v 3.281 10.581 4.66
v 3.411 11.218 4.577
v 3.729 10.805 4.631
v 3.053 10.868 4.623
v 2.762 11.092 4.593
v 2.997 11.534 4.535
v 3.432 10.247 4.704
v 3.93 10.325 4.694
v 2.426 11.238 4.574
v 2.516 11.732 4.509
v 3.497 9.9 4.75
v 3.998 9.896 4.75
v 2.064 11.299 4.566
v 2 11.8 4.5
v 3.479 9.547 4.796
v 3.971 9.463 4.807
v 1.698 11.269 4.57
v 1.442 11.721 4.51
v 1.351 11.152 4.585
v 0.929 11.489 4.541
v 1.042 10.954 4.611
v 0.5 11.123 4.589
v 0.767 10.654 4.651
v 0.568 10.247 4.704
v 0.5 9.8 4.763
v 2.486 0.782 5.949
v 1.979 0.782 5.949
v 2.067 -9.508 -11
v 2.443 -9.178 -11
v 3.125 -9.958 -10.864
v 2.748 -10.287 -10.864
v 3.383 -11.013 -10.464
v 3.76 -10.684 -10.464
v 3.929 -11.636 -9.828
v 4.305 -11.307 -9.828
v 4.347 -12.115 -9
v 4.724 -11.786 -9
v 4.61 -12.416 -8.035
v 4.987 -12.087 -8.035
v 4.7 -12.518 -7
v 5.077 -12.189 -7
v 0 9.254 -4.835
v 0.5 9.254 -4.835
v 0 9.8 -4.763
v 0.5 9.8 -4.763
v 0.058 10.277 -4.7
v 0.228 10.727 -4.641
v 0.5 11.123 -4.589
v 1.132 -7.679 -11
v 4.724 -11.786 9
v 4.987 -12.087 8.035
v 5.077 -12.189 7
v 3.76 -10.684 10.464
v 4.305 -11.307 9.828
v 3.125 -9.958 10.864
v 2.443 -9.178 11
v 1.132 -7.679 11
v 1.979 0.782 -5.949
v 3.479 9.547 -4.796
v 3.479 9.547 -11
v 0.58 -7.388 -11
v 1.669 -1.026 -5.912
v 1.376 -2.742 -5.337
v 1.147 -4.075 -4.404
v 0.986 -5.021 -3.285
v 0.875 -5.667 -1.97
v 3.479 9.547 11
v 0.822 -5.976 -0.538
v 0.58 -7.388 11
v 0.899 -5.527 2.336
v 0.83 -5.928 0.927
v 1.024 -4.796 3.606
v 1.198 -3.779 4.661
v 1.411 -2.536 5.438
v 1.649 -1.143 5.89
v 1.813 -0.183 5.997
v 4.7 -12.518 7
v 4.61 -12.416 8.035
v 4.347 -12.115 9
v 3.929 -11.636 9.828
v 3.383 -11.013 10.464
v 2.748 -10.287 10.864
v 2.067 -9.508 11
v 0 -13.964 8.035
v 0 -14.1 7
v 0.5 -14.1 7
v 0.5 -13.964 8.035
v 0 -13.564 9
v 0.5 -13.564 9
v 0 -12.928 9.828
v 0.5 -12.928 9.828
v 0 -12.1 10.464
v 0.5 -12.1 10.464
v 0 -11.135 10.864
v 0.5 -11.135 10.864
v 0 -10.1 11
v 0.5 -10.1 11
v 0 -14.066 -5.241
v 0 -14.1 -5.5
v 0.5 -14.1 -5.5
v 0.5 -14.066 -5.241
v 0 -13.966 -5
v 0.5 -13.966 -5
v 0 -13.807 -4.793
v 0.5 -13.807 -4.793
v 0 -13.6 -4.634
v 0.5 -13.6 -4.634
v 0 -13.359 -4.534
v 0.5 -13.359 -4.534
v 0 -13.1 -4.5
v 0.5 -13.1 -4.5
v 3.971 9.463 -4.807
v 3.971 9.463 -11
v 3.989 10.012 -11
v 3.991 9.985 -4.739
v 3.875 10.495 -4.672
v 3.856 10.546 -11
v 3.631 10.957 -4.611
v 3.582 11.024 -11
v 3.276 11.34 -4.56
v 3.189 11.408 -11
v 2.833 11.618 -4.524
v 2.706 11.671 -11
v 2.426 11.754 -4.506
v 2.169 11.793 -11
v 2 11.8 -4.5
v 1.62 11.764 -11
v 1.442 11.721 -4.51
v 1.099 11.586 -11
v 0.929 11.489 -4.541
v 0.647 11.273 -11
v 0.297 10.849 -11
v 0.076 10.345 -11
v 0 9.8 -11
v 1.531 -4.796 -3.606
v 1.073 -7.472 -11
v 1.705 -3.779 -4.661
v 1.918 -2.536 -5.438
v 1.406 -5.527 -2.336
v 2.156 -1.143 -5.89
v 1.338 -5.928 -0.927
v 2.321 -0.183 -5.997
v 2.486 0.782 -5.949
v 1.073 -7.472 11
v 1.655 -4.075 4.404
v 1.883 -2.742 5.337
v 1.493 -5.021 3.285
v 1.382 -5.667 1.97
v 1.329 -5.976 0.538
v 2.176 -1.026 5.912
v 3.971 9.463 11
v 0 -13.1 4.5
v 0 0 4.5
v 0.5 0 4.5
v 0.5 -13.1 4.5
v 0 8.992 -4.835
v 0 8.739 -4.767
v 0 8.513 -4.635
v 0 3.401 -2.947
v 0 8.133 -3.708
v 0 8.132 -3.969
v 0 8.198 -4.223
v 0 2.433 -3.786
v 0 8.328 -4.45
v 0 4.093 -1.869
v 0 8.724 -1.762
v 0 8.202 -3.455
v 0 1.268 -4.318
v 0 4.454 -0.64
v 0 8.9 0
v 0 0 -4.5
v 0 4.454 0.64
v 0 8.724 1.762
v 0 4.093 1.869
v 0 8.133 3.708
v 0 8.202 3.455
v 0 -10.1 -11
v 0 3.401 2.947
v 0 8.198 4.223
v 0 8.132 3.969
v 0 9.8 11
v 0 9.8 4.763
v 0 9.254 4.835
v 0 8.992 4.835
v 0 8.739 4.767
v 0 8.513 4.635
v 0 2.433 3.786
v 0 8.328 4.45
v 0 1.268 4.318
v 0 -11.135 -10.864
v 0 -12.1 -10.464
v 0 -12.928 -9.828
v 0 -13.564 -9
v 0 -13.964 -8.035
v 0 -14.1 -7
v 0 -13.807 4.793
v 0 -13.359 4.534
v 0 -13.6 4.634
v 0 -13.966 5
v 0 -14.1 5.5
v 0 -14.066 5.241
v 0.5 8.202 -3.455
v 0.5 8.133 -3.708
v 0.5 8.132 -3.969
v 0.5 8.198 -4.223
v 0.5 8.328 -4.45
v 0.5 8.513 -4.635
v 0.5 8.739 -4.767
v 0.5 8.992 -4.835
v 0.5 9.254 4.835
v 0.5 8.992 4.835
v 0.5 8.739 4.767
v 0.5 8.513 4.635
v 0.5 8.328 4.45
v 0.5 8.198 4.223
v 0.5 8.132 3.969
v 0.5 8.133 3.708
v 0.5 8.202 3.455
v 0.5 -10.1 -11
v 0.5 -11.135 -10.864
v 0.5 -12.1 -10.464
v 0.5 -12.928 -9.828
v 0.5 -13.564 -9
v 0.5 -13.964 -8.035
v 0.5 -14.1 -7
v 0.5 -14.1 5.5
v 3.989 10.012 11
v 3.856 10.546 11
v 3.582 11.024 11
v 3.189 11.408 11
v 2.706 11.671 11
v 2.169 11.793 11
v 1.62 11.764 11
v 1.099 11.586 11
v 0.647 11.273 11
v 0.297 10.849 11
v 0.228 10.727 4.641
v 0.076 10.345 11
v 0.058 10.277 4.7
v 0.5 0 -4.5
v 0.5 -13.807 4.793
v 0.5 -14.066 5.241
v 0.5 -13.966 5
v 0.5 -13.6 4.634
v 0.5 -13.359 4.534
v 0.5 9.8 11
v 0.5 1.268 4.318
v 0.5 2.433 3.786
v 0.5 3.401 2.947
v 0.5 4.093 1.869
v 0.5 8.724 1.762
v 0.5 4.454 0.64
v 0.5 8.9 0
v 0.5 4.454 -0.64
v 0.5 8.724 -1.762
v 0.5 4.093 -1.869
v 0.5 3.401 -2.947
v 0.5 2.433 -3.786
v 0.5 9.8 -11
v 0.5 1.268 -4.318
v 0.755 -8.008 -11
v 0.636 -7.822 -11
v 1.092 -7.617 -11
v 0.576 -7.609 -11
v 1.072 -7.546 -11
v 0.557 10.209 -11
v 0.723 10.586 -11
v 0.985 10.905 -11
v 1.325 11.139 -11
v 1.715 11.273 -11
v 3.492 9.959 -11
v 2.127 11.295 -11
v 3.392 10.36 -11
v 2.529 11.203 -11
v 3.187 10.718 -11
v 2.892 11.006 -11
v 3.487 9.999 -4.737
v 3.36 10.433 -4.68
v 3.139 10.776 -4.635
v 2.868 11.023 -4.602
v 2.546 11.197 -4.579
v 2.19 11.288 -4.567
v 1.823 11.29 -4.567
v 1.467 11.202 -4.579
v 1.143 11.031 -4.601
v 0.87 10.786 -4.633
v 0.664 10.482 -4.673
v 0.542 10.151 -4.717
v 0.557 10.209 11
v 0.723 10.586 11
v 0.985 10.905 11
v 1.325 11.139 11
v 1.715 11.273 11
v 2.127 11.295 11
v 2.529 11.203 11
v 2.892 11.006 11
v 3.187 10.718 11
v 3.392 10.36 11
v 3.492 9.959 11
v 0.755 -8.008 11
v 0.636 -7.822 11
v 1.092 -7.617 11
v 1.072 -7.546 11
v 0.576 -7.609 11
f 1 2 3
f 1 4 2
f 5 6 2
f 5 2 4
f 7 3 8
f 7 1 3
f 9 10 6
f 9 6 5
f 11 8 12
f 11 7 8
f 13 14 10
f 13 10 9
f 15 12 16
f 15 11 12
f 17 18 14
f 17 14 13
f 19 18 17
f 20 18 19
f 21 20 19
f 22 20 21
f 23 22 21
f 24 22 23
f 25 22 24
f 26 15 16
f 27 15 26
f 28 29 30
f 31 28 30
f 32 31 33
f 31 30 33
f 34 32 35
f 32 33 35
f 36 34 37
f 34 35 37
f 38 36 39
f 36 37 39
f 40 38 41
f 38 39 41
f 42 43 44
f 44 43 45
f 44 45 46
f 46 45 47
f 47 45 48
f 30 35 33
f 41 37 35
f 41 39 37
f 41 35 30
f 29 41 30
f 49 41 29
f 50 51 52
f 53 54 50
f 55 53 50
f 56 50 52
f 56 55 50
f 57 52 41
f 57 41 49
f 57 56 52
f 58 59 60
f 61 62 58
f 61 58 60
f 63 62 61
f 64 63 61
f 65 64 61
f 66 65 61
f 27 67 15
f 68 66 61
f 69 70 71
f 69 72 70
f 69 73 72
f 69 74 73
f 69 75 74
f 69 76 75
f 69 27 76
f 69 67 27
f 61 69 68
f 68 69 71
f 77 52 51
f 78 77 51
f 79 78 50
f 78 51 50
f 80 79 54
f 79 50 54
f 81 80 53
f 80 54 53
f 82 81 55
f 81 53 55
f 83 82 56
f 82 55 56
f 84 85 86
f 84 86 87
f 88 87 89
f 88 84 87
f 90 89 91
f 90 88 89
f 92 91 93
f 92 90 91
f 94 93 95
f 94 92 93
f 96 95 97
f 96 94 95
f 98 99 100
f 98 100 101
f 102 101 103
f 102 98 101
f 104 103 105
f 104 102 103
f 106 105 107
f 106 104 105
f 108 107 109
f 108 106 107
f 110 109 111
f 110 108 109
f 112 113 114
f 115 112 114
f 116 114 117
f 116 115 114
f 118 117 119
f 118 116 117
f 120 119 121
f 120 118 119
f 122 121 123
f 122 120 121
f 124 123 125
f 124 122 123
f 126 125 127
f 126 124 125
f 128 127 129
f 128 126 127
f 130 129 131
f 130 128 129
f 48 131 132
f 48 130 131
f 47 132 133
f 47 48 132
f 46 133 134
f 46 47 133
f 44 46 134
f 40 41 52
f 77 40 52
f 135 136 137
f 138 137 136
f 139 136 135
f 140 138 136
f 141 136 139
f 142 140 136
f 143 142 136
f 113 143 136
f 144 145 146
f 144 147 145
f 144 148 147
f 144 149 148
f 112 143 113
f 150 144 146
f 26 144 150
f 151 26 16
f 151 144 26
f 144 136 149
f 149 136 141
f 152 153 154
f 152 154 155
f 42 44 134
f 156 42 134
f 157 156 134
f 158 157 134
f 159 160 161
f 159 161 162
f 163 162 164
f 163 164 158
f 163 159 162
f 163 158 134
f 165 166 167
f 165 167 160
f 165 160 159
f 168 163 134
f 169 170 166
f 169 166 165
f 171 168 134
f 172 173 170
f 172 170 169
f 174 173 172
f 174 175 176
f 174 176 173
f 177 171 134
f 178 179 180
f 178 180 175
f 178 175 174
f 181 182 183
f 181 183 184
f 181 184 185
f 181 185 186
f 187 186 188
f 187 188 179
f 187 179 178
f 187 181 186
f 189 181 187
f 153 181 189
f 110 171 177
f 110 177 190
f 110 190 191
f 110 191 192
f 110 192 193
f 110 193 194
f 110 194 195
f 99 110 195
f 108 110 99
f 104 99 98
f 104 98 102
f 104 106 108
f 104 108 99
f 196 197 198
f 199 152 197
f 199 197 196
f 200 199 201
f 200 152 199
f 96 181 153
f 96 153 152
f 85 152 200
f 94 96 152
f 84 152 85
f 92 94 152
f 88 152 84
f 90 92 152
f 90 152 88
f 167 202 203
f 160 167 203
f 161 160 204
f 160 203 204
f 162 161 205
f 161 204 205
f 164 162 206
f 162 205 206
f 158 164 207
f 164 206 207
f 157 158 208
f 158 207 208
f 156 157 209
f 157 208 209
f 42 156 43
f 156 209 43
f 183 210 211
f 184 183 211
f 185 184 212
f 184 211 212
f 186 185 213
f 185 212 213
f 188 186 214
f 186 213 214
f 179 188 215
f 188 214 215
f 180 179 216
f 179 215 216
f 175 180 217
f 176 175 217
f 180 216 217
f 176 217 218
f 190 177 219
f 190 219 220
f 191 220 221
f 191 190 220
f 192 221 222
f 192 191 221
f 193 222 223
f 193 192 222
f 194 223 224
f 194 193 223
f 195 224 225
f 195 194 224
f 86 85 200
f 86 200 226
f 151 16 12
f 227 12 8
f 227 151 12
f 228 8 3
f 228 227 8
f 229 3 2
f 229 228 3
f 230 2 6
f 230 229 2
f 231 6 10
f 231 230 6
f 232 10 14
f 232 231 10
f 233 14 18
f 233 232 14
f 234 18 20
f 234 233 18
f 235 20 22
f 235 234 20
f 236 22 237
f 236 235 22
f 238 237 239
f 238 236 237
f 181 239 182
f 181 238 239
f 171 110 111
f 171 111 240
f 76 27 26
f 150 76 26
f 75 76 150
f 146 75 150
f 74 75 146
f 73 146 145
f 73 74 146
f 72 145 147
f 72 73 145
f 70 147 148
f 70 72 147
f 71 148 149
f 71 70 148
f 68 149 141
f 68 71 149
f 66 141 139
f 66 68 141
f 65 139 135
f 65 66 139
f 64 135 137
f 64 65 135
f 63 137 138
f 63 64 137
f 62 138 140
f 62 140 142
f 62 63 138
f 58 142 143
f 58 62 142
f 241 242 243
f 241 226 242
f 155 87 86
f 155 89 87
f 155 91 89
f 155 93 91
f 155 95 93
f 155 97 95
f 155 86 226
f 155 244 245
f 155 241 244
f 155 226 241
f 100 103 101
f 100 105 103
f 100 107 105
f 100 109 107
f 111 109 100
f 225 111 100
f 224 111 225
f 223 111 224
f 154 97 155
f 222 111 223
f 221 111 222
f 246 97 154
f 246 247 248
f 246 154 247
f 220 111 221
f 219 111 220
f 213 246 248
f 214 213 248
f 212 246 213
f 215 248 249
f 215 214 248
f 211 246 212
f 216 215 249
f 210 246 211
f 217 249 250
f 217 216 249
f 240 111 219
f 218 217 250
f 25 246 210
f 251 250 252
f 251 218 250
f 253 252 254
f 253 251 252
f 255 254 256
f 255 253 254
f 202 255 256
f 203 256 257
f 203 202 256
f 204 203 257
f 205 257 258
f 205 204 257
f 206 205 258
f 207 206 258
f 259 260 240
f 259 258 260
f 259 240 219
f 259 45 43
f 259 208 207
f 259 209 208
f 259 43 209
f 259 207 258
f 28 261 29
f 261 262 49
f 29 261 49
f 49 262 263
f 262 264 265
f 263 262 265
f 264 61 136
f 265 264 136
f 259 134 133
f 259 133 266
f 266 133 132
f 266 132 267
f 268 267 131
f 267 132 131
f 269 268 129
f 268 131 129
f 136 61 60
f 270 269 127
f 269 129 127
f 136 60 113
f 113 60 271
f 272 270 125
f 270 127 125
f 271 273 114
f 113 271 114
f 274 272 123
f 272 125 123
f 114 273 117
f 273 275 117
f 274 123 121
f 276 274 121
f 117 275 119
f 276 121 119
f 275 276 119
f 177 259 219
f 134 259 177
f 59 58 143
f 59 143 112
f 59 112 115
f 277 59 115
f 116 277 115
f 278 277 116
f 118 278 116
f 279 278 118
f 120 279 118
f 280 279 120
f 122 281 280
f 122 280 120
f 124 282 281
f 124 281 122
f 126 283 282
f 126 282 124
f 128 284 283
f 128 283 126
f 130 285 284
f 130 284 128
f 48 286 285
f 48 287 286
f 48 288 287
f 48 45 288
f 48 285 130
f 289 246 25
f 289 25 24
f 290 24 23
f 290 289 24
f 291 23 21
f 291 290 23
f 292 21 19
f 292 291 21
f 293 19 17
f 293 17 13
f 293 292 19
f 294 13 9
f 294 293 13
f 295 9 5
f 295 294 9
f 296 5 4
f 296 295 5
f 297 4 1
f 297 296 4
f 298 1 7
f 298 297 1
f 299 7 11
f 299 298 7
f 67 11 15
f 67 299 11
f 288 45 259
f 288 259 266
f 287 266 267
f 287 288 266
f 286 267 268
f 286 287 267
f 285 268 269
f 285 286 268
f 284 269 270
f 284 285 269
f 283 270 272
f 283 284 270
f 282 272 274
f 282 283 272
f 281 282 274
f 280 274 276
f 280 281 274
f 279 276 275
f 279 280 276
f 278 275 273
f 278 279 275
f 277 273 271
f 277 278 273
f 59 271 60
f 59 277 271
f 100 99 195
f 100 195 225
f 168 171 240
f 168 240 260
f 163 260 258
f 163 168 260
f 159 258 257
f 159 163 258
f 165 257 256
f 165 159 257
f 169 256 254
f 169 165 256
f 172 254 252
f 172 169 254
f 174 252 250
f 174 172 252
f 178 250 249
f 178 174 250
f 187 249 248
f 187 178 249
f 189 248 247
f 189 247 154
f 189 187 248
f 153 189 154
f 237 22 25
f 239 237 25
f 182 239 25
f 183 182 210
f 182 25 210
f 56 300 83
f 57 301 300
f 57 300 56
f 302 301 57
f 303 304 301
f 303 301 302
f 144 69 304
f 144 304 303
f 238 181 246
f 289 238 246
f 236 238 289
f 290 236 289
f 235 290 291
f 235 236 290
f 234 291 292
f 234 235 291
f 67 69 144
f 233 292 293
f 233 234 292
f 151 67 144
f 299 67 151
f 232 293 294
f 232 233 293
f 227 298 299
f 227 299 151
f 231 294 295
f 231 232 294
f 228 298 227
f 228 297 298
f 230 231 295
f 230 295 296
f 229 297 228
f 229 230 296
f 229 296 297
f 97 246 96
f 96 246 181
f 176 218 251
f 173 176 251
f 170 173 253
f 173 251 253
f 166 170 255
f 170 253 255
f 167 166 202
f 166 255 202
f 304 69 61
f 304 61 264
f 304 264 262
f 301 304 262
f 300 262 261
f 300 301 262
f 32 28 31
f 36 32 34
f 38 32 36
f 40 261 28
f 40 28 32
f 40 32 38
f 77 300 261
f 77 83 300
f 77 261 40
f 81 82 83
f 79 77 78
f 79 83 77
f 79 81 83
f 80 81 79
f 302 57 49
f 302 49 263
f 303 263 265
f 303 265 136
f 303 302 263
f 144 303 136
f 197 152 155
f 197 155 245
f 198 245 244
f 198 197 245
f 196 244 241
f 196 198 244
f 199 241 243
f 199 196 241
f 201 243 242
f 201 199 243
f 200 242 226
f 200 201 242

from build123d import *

# Parameters (mm, degrees)
BOSS_EXTRUDE1_DEPTH      = 11
BOSS_EXTRUDE1_DEPTH_BACK = 11
CUT_EXTRUDE1_DEPTH       = 0.5
CUT_EXTRUDE2_DEPTH       = 5
CUT_EXTRUDE3_DEPTH       = 5
CUT_EXTRUDE4_DEPTH       = 0.5
CUT_EXTRUDE5_DEPTH       = 0.5
CUT_EXTRUDE6_DEPTH       = 0.5
CUT_EXTRUDE7_DEPTH       = 0.5
CUT_EXTRUDE8_DEPTH       = 1
CUT_EXTRUDE8_DEPTH_BACK  = 1


with BuildPart() as part:
    # Sketch1 → Boss-Extrude1 (new, two sides: drawn at the far end of the back side and taken through both)
    with BuildSketch(Plane.XY.offset(-BOSS_EXTRUDE1_DEPTH_BACK)):
        with BuildLine():
            Line((0, 9.8), (0, -14.1))
            Line((0, -14.1), (0.5, -14.1))
            Line((0.5, -14.1), (0.5, 9.8))
            ThreePointArc((0.5, 9.8), (2.126963265, 11.294617118), (3.478507106, 9.546984708))
            Line((3.478507106, 9.546984708), (0.580460074, -7.387893417))
            ThreePointArc((0.580460074, -7.387893417), (0.597810426, -7.717762239), (0.75519649, -8.008182798))
            Line((0.75519649, -8.008182798), (4.700431296, -12.518581837))
            Line((4.700431296, -12.518581837), (5.076776054, -12.189394014))
            Line((5.076776054, -12.189394014), (1.131541248, -7.678994975))
            ThreePointArc((1.131541248, -7.678994975), (1.079079227, -7.582188122), (1.073295776, -7.472231848))
            Line((1.073295776, -7.472231848), (3.971342808, 9.462646278))
            ThreePointArc((3.971342808, 9.462646278), (2.169284353, 11.792822824), (0, 9.8))
        make_face()
    extrude(amount=BOSS_EXTRUDE1_DEPTH + BOSS_EXTRUDE1_DEPTH_BACK)

    # Sketch2 → Cut-Extrude1 (cut)
    with BuildSketch(Plane(origin=(0, 0, 0), x_dir=(0, 0, -1), z_dir=(1, 0, 0))):
        with BuildLine():
            Line((-4.5, 0), (-4.5, -14.1))
            Line((-4.5, -14.1), (4.5, -14.1))
            Line((4.5, -14.1), (4.5, 0))
            ThreePointArc((4.5, 0), (0, 4.5), (-4.5, 0))
        make_face()
    extrude(amount=CUT_EXTRUDE1_DEPTH, mode=Mode.SUBTRACT)

    # Sketch3 → Cut-Extrude2 (cut)
    with BuildSketch(Plane(origin=(0.5, 0, 0), x_dir=(0, 0, -1), z_dir=(1, 0, 0))):
        with BuildLine():
            Line((5.948789681, 0.782241223), (4.5, 11.8))
            Line((4.5, 11.8), (-4.5, 11.8))
            Line((-4.5, 11.8), (-5.948789681, 0.782241223))
            ThreePointArc((-5.948789681, 0.782241223), (0, -6), (5.948789681, 0.782241223))
        make_face()
    extrude(amount=CUT_EXTRUDE2_DEPTH, mode=Mode.SUBTRACT)

    # Sketch4 → Cut-Extrude3 (cut)
    with BuildSketch(Plane(origin=(0.5, 0, 0), x_dir=(0, 0, -1), z_dir=(1, 0, 0))):
        with BuildLine():
            Line((4.834801398, 9.253901634), (4.5, 11.8))
            Line((4.5, 11.8), (-4.5, 11.8))
            Line((-4.5, 11.8), (-4.834801398, 9.253901634))
            ThreePointArc((-4.834801398, 9.253901634), (-4.449655576, 8.328306669), (-3.455120629, 8.20195961))
            ThreePointArc((-3.455120629, 8.20195961), (1.1e-08, 8.9), (3.455120648, 8.201959602))
            ThreePointArc((3.455120648, 8.201959602), (4.449655585, 8.328306676), (4.834801398, 9.253901634))
        make_face()
    extrude(amount=-CUT_EXTRUDE3_DEPTH, mode=Mode.SUBTRACT)

    # Sketch5 → Cut-Extrude4 (cut)
    with BuildSketch(Plane(origin=(0, 0, 0), x_dir=(0, 0, -1), z_dir=(1, 0, 0))):
        with BuildLine():
            Line((-11, -14.1), (-7, -14.1))
            ThreePointArc((-7, -14.1), (-9.828427125, -12.928427125), (-11, -10.1))
            Line((-11, -10.1), (-11, -14.1))
        make_face()
    extrude(amount=CUT_EXTRUDE4_DEPTH, mode=Mode.SUBTRACT)

    # Sketch6 → Cut-Extrude5 (cut)
    with BuildSketch(Plane(origin=(0, 0, 0), x_dir=(0, 0, -1), z_dir=(1, 0, 0))):
        with BuildLine():
            Line((7, -14.1), (11, -14.1))
            Line((11, -14.1), (11, -10.1))
            ThreePointArc((11, -10.1), (9.828427125, -12.928427125), (7, -14.1))
        make_face()
    extrude(amount=CUT_EXTRUDE5_DEPTH, mode=Mode.SUBTRACT)

    # Sketch7 → Cut-Extrude6 (cut)
    with BuildSketch(Plane(origin=(0, 0, 0), x_dir=(0, 0, -1), z_dir=(1, 0, 0))):
        with BuildLine():
            Line((4.5, -14.1), (5.5, -14.1))
            ThreePointArc((5.5, -14.1), (4.792893219, -13.807106781), (4.5, -13.1))
            Line((4.5, -13.1), (4.5, -14.1))
        make_face()
    extrude(amount=CUT_EXTRUDE6_DEPTH, mode=Mode.SUBTRACT)

    # Sketch8 → Cut-Extrude7 (cut)
    with BuildSketch(Plane(origin=(0, 0, 0), x_dir=(0, 0, -1), z_dir=(1, 0, 0))):
        with BuildLine():
            Line((-5.5, -14.1), (-4.5, -14.1))
            Line((-4.5, -14.1), (-4.5, -13.1))
            ThreePointArc((-4.5, -13.1), (-4.792893219, -13.807106781), (-5.5, -14.1))
        make_face()
    extrude(amount=CUT_EXTRUDE7_DEPTH, mode=Mode.SUBTRACT)

    # Sketch9 → Cut-Extrude8 (cut, two sides: drawn at the far end of the back side and taken through both)
    with BuildSketch(Plane(origin=(-3.164279663, -2.76778754, 0), x_dir=(0, 0, -1), z_dir=(0.7526895169963331, 0.6583756458161457, 0)).offset(-CUT_EXTRUDE8_DEPTH_BACK)):
        with BuildLine():
            Line((-11, -8.516878218), (-15, -8.516878218))
            Line((-15, -8.516878218), (-15, -16.516878218))
            Line((-15, -16.516878218), (15, -16.516878218))
            Line((15, -16.516878218), (15, -8.516878218))
            Line((15, -8.516878218), (11, -8.516878218))
            ThreePointArc((11, -8.516878218), (9.828427125, -11.345305343), (7, -12.516878218))
            Line((7, -12.516878218), (-7, -12.516878218))
            ThreePointArc((-7, -12.516878218), (-9.828427125, -11.345305343), (-11, -8.516878218))
        make_face()
    extrude(amount=CUT_EXTRUDE8_DEPTH + CUT_EXTRUDE8_DEPTH_BACK, mode=Mode.SUBTRACT)


solid = part.part
